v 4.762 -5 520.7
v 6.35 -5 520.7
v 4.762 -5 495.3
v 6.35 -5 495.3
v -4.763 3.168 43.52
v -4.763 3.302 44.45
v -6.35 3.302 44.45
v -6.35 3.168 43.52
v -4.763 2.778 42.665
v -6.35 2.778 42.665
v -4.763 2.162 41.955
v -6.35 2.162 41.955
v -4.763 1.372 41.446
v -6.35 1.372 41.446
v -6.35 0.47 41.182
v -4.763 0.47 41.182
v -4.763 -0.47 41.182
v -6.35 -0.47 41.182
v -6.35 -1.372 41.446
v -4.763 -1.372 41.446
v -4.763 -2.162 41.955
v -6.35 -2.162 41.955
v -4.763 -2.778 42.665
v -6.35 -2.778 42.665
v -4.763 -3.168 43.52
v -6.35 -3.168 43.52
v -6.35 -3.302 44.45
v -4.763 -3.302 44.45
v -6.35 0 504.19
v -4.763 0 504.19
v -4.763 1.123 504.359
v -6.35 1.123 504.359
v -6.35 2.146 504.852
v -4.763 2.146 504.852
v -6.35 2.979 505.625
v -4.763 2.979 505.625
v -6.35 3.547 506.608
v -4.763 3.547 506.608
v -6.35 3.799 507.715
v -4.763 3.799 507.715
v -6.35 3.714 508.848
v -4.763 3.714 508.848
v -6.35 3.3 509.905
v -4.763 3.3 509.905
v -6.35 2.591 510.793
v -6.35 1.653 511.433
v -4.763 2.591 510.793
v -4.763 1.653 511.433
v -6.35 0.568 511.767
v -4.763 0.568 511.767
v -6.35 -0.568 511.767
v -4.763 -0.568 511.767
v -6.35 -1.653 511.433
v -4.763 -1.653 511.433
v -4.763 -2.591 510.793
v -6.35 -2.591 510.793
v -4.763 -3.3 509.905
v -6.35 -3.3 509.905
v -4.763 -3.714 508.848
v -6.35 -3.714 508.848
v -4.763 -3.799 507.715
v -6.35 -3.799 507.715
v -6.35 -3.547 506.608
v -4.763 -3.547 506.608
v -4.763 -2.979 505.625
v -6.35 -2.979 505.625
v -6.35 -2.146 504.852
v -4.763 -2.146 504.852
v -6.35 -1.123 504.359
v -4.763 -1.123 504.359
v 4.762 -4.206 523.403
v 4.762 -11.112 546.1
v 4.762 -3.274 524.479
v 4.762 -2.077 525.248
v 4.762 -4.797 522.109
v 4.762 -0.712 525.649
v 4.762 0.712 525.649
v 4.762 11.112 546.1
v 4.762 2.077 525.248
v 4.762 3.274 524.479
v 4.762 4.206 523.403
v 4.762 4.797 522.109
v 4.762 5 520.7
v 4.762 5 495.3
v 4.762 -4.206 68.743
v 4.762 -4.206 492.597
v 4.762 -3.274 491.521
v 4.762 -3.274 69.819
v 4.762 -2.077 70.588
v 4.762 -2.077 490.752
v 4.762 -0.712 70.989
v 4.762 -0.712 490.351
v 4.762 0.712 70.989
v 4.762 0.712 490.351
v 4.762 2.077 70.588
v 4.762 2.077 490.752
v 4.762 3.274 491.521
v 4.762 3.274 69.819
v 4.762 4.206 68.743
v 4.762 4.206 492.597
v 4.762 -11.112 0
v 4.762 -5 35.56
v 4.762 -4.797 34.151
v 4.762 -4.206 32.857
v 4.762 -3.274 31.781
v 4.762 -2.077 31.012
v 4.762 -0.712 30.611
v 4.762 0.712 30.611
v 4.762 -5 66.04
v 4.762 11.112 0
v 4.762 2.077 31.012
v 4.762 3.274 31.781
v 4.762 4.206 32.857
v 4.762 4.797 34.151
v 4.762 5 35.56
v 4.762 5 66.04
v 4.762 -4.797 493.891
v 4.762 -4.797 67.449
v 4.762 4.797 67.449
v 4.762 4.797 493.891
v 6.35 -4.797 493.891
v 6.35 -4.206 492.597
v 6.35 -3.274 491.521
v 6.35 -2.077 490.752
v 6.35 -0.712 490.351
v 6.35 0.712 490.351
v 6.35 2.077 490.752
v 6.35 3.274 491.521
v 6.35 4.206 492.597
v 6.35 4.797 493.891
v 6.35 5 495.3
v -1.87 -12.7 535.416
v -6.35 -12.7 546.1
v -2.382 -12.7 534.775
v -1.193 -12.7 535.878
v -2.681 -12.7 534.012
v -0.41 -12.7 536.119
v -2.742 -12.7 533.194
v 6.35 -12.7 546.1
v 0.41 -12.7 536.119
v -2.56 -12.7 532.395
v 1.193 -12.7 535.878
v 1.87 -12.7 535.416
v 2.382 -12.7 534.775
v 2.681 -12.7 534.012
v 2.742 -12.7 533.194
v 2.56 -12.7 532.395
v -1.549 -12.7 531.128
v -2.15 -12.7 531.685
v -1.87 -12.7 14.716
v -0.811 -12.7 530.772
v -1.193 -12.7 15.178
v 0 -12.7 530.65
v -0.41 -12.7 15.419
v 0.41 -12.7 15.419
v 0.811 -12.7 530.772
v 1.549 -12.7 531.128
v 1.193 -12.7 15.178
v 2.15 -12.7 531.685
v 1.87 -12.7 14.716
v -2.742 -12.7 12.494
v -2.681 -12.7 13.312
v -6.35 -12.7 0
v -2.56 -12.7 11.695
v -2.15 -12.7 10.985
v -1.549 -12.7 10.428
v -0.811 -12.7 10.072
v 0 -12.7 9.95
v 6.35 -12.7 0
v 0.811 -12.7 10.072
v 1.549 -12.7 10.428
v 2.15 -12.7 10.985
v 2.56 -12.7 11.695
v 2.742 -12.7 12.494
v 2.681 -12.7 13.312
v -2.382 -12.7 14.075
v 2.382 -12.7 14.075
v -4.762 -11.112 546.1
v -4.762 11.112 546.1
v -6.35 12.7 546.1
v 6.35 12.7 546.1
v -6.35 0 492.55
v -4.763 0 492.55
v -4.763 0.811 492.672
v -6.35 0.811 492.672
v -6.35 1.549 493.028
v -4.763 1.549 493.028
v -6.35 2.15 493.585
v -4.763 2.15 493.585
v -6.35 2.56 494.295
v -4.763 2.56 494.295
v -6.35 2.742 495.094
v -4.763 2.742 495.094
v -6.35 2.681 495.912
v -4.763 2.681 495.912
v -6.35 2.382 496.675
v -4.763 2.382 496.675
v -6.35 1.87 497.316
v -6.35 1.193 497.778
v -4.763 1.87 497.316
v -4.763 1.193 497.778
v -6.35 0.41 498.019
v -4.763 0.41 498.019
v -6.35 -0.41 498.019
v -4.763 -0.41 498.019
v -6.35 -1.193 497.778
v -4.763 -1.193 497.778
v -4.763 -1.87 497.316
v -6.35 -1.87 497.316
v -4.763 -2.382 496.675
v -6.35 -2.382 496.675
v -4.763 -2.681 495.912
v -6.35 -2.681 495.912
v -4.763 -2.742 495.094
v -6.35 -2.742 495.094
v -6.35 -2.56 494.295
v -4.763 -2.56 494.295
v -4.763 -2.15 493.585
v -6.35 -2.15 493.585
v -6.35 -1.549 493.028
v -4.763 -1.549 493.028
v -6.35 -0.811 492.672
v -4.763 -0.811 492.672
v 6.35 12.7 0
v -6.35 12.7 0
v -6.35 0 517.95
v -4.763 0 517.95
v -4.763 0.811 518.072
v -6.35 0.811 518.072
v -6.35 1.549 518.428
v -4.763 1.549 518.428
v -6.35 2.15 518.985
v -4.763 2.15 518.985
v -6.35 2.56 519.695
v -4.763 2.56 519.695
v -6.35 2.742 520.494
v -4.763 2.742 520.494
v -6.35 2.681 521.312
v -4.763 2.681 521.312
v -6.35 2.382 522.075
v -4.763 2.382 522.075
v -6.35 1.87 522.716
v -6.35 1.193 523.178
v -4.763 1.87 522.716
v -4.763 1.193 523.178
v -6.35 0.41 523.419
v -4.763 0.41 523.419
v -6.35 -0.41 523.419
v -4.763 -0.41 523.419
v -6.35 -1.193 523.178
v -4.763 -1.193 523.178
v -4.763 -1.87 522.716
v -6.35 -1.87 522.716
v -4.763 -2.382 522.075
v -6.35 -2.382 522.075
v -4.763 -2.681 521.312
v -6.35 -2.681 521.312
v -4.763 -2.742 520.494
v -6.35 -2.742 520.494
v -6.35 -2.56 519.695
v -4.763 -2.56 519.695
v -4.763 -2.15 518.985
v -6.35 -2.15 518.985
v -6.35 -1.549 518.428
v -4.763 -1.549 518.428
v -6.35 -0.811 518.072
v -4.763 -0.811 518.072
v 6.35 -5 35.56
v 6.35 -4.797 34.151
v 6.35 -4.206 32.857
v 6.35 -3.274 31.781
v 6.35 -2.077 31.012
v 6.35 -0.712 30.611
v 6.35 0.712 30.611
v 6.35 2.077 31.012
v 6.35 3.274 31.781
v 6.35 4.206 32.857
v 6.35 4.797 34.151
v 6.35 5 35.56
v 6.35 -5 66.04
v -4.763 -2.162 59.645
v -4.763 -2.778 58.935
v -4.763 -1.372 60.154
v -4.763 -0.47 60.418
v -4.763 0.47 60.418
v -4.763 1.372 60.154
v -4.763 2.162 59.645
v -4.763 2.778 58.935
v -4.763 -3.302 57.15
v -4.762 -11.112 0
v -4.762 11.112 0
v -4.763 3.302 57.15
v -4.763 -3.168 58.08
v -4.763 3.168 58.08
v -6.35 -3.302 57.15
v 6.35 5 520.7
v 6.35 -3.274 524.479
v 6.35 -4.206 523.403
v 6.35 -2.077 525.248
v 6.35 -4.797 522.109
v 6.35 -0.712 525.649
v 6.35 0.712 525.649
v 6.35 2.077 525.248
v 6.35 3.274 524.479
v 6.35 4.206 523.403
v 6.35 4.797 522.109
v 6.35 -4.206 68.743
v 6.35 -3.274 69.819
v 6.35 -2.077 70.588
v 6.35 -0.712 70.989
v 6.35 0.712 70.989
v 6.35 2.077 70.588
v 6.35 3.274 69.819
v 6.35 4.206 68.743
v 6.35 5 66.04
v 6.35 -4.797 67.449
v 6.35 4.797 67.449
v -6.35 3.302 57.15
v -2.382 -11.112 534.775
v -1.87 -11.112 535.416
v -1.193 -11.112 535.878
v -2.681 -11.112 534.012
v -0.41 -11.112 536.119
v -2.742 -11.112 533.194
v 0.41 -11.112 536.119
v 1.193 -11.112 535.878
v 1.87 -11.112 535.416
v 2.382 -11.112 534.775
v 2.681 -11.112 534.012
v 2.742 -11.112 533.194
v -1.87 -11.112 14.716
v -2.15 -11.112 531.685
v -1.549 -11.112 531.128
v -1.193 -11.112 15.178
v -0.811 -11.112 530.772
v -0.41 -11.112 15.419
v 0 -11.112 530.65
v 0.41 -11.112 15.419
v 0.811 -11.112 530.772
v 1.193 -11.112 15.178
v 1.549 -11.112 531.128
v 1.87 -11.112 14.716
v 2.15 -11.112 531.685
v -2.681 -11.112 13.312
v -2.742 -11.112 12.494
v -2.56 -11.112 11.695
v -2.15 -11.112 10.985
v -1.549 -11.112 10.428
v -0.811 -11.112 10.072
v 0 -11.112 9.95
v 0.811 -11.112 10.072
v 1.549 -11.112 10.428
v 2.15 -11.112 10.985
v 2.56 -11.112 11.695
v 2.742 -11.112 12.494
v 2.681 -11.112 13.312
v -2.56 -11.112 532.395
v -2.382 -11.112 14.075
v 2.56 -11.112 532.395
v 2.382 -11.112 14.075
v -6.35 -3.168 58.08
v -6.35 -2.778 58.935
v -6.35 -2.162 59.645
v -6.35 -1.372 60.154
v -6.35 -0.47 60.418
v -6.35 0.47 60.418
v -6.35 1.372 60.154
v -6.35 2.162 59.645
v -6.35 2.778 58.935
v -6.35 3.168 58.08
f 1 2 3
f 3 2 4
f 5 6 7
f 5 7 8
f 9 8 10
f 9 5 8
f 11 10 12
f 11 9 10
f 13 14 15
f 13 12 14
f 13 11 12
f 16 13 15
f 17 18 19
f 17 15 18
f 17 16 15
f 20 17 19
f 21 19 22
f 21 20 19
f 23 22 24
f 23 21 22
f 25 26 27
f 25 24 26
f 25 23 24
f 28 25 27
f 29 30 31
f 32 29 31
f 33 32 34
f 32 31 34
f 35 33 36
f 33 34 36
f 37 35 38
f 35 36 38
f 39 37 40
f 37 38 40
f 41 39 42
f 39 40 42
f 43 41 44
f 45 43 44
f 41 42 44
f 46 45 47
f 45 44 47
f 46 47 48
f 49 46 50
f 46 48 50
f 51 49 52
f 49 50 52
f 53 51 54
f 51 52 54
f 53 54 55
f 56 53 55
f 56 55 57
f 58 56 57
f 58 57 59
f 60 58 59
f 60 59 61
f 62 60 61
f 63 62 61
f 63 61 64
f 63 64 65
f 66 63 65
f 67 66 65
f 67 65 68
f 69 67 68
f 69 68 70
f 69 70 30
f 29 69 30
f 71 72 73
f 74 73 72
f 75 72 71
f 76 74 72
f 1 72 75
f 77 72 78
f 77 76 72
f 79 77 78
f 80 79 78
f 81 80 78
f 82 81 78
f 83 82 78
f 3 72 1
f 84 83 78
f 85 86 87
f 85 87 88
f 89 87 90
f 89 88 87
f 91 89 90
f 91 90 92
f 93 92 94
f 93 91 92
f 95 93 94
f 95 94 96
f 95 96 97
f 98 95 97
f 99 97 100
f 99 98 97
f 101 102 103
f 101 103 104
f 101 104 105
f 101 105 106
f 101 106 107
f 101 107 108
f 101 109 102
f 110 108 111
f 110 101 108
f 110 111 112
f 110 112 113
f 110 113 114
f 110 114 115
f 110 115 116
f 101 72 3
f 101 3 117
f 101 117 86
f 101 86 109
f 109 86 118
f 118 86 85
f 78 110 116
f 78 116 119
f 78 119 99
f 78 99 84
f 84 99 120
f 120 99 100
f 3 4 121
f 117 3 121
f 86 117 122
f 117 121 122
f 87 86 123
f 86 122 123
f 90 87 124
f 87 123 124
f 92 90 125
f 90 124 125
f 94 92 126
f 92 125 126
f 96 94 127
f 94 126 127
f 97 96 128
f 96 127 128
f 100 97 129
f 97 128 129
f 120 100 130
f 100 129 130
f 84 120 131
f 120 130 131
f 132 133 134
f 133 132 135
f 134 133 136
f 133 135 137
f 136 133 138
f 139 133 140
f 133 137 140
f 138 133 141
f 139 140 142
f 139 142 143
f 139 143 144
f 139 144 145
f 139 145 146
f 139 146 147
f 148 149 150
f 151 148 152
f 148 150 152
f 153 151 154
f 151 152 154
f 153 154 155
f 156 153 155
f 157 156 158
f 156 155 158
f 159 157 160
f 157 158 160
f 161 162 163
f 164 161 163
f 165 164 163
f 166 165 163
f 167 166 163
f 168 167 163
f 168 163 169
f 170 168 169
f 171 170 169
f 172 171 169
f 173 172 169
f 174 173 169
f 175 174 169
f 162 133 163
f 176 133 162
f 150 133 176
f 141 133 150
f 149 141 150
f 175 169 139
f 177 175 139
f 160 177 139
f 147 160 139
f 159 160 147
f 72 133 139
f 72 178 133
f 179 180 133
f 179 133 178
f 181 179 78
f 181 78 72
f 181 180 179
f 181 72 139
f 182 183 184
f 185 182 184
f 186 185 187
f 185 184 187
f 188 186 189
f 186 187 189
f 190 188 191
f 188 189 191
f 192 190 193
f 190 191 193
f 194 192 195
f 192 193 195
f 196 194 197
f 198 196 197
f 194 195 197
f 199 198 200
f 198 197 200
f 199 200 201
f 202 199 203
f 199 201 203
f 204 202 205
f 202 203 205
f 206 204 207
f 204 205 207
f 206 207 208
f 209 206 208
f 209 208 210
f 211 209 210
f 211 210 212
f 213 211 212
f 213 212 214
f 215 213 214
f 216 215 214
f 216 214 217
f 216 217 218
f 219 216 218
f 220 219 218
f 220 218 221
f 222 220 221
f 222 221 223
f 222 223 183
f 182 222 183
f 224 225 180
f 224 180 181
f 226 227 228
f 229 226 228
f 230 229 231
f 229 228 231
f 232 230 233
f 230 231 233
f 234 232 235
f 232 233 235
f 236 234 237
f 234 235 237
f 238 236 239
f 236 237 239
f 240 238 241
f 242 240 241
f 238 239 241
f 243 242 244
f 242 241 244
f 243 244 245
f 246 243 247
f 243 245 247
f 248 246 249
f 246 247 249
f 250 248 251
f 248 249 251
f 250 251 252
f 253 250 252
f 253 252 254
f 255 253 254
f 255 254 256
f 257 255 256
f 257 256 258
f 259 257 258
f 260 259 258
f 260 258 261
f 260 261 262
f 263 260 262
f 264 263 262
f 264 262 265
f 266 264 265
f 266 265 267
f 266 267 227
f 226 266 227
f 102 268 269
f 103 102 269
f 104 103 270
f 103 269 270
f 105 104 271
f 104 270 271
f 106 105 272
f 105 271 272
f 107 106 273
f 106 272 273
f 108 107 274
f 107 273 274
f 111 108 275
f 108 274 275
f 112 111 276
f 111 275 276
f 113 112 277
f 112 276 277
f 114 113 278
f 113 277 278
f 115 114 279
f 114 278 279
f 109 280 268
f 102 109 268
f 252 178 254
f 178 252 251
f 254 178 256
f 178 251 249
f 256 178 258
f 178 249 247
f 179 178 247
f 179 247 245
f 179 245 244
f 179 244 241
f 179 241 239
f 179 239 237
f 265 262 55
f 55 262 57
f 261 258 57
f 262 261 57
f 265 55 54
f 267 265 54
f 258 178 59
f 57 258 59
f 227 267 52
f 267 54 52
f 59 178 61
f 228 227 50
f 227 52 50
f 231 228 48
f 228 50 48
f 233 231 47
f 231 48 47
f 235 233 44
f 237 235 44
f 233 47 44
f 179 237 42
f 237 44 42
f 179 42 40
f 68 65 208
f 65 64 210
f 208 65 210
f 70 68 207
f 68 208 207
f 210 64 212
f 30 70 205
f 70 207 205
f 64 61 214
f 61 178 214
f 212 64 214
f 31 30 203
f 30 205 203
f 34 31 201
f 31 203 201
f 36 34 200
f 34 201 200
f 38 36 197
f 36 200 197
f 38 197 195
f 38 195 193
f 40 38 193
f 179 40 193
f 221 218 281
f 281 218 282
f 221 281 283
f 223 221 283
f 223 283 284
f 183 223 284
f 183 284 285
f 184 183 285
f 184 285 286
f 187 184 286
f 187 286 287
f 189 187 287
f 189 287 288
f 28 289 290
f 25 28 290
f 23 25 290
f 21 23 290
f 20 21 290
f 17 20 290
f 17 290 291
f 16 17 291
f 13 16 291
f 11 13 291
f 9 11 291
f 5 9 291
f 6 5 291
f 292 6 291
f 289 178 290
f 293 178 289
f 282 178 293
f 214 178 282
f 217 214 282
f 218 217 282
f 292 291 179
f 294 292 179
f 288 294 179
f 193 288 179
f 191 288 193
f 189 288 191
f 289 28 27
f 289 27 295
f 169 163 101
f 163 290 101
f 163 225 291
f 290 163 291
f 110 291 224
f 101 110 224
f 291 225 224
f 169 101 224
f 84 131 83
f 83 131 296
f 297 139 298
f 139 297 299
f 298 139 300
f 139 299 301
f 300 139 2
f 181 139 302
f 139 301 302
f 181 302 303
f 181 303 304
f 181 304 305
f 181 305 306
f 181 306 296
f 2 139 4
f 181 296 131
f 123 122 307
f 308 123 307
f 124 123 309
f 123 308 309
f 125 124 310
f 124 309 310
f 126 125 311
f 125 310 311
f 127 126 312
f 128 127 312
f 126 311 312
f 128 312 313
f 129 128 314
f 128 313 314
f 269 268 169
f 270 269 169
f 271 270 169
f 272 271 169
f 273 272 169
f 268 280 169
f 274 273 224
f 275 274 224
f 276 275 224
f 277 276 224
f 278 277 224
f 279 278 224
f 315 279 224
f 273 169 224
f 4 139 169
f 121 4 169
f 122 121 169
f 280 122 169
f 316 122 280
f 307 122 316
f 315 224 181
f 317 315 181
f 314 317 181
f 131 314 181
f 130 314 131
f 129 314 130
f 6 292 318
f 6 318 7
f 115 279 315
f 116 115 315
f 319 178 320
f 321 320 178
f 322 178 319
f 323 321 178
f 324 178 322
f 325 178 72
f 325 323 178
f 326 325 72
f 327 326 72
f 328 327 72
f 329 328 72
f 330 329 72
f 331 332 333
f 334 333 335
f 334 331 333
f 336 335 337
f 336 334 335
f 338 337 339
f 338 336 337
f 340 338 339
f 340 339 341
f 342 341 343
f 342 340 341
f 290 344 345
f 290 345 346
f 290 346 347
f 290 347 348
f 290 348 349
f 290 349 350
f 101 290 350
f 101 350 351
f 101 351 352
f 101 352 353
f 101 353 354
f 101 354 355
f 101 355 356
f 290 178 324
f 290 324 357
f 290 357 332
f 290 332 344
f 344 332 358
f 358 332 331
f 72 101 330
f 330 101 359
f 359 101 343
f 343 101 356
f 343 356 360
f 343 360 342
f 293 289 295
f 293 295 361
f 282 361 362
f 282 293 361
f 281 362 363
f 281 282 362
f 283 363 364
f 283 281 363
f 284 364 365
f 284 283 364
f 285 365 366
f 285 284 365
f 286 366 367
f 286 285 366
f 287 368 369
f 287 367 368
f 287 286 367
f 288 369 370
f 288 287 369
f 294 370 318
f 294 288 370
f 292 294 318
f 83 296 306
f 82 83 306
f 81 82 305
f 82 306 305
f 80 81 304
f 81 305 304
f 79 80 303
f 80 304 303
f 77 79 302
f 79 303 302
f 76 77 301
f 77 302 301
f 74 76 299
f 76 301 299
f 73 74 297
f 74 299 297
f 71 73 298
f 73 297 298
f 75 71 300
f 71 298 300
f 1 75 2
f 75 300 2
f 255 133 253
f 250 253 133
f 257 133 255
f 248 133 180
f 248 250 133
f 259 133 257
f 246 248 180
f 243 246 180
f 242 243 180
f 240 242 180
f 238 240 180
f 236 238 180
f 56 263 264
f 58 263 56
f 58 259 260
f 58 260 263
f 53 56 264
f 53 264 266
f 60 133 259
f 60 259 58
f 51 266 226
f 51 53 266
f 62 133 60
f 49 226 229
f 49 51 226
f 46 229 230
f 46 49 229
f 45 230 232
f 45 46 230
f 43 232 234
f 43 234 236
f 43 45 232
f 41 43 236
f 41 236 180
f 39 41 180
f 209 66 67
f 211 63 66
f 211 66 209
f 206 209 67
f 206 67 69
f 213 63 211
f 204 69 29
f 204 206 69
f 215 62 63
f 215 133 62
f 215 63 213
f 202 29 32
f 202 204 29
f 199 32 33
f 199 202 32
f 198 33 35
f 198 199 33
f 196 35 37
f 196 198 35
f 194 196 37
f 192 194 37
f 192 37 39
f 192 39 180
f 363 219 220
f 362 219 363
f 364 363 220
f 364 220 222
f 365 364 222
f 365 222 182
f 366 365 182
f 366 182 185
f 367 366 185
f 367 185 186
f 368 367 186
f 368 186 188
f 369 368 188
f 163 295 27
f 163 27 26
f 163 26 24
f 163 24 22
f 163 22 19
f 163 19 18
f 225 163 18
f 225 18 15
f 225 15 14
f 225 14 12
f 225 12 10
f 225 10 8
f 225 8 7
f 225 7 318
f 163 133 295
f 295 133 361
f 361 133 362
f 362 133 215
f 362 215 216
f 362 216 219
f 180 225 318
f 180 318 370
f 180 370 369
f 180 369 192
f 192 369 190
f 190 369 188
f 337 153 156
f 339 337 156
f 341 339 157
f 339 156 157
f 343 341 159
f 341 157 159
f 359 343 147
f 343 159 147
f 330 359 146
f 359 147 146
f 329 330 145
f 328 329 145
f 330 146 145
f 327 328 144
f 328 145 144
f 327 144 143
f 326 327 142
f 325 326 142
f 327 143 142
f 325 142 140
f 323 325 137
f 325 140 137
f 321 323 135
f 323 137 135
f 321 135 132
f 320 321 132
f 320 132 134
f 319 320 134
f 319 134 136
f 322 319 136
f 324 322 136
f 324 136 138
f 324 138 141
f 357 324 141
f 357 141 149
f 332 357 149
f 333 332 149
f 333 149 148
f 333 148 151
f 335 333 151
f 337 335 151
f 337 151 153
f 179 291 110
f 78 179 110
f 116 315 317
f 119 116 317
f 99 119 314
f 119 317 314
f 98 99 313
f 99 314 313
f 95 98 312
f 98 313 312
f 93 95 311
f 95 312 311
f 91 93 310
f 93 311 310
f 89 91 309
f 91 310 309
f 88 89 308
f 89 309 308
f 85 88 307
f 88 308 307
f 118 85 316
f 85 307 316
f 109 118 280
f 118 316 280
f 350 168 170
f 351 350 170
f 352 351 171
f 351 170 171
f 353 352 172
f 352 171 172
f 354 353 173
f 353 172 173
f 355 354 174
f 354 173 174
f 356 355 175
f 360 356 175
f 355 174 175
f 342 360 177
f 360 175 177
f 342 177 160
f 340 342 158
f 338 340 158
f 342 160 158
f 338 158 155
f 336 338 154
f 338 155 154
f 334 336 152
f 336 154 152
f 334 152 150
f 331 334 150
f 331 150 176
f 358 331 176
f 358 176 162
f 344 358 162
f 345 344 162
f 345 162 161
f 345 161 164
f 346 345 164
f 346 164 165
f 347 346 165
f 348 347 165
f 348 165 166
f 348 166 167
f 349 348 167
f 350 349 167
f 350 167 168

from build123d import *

# Parameters (mm, degrees)
SKETCH1_W           = 12.7
SKETCH1_H           = 25.4
SKETCH1_W_2         = 9.525
SKETCH1_H_2         = 22.225
BOSS_EXTRUDE1_DEPTH = 546.1
SKETCH2_R           = 3.81
SKETCH2_R_2         = 2.75
CUT_EXTRUDE1_DEPTH  = 547.395269013
CUT_EXTRUDE3_REACH  = 548.395
CUT_EXTRUDE5_REACH  = 548.727
SKETCH5_R           = 2.75


with BuildPart() as part:
    # Sketch1 → Boss-Extrude1 (new body)
    with BuildSketch(Plane.XY):
        Rectangle(SKETCH1_W, SKETCH1_H)
        Rectangle(SKETCH1_W_2, SKETCH1_H_2, mode=Mode.SUBTRACT)
    extrude(amount=BOSS_EXTRUDE1_DEPTH)

    # Sketch2 → Cut-Extrude1 (cut, through all)
    with BuildSketch(Plane(origin=(6.35, 0, 0), x_dir=(0, 0, -1), z_dir=(1, 0, 0))):
        with Locations((-508, 0)):
            Circle(SKETCH2_R)
        with Locations((-520.7, 0)):
            Circle(SKETCH2_R_2)
        with Locations((-495.3, 0)):
            Circle(SKETCH2_R_2)
        with BuildLine():
            Line((-44.45, -3.302), (-57.15, -3.302))
            ThreePointArc((-57.15, -3.302), (-60.452, 0), (-57.15, 3.302))
            Line((-57.15, 3.302), (-44.45, 3.302))
            ThreePointArc((-44.45, 3.302), (-41.148, 0), (-44.45, -3.302))
        make_face()
    extrude(amount=-CUT_EXTRUDE1_DEPTH, mode=Mode.SUBTRACT)

    # Sketch4 → Cut-Extrude3 (cut, up to next)
    with BuildSketch(Plane.ZY.offset(-6.35), mode=Mode.PRIVATE) as cut_extrude3_sk1:
        with BuildLine():
            Line((35.56, 5), (66.04, 5))
            ThreePointArc((66.04, 5), (71.04, 0), (66.04, -5))
            Line((66.04, -5), (35.56, -5))
            ThreePointArc((35.56, -5), (30.56, 0), (35.56, 5))
        make_face()
    cut_extrude3_tool1 = extrude(cut_extrude3_sk1.sketch, amount=CUT_EXTRUDE3_REACH, mode=Mode.PRIVATE) & part.part
    # Sketch4 → Cut-Extrude3 (cut, up to next)
    with BuildSketch(Plane.ZY.offset(-6.35), mode=Mode.PRIVATE) as cut_extrude3_sk2:
        with BuildLine():
            Line((495.3, 5), (520.7, 5))
            ThreePointArc((520.7, 5), (525.7, 0), (520.7, -5))
            Line((520.7, -5), (495.3, -5))
            ThreePointArc((495.3, -5), (490.3, 0), (495.3, 5))
        make_face()
    cut_extrude3_tool2 = extrude(cut_extrude3_sk2.sketch, amount=CUT_EXTRUDE3_REACH, mode=Mode.PRIVATE) & part.part
    add(cut_extrude3_tool1.solids().sort_by_distance((6.35, 0, 50.8))[0], mode=Mode.SUBTRACT)
    add(cut_extrude3_tool2.solids().sort_by_distance((6.35, 0, 508))[0], mode=Mode.SUBTRACT)

    # Sketch5 → Cut-Extrude5 (cut, up to next)
    with BuildSketch(Plane.XZ.offset(12.7), mode=Mode.PRIVATE) as cut_extrude5_sk1:
        with Locations(Location((0, 533.4, 0), (0, 0, 270))):
            Circle(SKETCH5_R)
    cut_extrude5_tool1 = extrude(cut_extrude5_sk1.sketch, amount=-CUT_EXTRUDE5_REACH, mode=Mode.PRIVATE) & part.part
    # Sketch5 → Cut-Extrude5 (cut, up to next)
    with BuildSketch(Plane.XZ.offset(12.7), mode=Mode.PRIVATE) as cut_extrude5_sk2:
        with Locations(Location((0, 12.7, 0), (0, 0, 270))):
            Circle(SKETCH5_R)
    cut_extrude5_tool2 = extrude(cut_extrude5_sk2.sketch, amount=-CUT_EXTRUDE5_REACH, mode=Mode.PRIVATE) & part.part
    add(cut_extrude5_tool1.solids().sort_by_distance((0, -12.7, 533.4))[0], mode=Mode.SUBTRACT)
    add(cut_extrude5_tool2.solids().sort_by_distance((0, -12.7, 12.7))[0], mode=Mode.SUBTRACT)


solid = part.part
